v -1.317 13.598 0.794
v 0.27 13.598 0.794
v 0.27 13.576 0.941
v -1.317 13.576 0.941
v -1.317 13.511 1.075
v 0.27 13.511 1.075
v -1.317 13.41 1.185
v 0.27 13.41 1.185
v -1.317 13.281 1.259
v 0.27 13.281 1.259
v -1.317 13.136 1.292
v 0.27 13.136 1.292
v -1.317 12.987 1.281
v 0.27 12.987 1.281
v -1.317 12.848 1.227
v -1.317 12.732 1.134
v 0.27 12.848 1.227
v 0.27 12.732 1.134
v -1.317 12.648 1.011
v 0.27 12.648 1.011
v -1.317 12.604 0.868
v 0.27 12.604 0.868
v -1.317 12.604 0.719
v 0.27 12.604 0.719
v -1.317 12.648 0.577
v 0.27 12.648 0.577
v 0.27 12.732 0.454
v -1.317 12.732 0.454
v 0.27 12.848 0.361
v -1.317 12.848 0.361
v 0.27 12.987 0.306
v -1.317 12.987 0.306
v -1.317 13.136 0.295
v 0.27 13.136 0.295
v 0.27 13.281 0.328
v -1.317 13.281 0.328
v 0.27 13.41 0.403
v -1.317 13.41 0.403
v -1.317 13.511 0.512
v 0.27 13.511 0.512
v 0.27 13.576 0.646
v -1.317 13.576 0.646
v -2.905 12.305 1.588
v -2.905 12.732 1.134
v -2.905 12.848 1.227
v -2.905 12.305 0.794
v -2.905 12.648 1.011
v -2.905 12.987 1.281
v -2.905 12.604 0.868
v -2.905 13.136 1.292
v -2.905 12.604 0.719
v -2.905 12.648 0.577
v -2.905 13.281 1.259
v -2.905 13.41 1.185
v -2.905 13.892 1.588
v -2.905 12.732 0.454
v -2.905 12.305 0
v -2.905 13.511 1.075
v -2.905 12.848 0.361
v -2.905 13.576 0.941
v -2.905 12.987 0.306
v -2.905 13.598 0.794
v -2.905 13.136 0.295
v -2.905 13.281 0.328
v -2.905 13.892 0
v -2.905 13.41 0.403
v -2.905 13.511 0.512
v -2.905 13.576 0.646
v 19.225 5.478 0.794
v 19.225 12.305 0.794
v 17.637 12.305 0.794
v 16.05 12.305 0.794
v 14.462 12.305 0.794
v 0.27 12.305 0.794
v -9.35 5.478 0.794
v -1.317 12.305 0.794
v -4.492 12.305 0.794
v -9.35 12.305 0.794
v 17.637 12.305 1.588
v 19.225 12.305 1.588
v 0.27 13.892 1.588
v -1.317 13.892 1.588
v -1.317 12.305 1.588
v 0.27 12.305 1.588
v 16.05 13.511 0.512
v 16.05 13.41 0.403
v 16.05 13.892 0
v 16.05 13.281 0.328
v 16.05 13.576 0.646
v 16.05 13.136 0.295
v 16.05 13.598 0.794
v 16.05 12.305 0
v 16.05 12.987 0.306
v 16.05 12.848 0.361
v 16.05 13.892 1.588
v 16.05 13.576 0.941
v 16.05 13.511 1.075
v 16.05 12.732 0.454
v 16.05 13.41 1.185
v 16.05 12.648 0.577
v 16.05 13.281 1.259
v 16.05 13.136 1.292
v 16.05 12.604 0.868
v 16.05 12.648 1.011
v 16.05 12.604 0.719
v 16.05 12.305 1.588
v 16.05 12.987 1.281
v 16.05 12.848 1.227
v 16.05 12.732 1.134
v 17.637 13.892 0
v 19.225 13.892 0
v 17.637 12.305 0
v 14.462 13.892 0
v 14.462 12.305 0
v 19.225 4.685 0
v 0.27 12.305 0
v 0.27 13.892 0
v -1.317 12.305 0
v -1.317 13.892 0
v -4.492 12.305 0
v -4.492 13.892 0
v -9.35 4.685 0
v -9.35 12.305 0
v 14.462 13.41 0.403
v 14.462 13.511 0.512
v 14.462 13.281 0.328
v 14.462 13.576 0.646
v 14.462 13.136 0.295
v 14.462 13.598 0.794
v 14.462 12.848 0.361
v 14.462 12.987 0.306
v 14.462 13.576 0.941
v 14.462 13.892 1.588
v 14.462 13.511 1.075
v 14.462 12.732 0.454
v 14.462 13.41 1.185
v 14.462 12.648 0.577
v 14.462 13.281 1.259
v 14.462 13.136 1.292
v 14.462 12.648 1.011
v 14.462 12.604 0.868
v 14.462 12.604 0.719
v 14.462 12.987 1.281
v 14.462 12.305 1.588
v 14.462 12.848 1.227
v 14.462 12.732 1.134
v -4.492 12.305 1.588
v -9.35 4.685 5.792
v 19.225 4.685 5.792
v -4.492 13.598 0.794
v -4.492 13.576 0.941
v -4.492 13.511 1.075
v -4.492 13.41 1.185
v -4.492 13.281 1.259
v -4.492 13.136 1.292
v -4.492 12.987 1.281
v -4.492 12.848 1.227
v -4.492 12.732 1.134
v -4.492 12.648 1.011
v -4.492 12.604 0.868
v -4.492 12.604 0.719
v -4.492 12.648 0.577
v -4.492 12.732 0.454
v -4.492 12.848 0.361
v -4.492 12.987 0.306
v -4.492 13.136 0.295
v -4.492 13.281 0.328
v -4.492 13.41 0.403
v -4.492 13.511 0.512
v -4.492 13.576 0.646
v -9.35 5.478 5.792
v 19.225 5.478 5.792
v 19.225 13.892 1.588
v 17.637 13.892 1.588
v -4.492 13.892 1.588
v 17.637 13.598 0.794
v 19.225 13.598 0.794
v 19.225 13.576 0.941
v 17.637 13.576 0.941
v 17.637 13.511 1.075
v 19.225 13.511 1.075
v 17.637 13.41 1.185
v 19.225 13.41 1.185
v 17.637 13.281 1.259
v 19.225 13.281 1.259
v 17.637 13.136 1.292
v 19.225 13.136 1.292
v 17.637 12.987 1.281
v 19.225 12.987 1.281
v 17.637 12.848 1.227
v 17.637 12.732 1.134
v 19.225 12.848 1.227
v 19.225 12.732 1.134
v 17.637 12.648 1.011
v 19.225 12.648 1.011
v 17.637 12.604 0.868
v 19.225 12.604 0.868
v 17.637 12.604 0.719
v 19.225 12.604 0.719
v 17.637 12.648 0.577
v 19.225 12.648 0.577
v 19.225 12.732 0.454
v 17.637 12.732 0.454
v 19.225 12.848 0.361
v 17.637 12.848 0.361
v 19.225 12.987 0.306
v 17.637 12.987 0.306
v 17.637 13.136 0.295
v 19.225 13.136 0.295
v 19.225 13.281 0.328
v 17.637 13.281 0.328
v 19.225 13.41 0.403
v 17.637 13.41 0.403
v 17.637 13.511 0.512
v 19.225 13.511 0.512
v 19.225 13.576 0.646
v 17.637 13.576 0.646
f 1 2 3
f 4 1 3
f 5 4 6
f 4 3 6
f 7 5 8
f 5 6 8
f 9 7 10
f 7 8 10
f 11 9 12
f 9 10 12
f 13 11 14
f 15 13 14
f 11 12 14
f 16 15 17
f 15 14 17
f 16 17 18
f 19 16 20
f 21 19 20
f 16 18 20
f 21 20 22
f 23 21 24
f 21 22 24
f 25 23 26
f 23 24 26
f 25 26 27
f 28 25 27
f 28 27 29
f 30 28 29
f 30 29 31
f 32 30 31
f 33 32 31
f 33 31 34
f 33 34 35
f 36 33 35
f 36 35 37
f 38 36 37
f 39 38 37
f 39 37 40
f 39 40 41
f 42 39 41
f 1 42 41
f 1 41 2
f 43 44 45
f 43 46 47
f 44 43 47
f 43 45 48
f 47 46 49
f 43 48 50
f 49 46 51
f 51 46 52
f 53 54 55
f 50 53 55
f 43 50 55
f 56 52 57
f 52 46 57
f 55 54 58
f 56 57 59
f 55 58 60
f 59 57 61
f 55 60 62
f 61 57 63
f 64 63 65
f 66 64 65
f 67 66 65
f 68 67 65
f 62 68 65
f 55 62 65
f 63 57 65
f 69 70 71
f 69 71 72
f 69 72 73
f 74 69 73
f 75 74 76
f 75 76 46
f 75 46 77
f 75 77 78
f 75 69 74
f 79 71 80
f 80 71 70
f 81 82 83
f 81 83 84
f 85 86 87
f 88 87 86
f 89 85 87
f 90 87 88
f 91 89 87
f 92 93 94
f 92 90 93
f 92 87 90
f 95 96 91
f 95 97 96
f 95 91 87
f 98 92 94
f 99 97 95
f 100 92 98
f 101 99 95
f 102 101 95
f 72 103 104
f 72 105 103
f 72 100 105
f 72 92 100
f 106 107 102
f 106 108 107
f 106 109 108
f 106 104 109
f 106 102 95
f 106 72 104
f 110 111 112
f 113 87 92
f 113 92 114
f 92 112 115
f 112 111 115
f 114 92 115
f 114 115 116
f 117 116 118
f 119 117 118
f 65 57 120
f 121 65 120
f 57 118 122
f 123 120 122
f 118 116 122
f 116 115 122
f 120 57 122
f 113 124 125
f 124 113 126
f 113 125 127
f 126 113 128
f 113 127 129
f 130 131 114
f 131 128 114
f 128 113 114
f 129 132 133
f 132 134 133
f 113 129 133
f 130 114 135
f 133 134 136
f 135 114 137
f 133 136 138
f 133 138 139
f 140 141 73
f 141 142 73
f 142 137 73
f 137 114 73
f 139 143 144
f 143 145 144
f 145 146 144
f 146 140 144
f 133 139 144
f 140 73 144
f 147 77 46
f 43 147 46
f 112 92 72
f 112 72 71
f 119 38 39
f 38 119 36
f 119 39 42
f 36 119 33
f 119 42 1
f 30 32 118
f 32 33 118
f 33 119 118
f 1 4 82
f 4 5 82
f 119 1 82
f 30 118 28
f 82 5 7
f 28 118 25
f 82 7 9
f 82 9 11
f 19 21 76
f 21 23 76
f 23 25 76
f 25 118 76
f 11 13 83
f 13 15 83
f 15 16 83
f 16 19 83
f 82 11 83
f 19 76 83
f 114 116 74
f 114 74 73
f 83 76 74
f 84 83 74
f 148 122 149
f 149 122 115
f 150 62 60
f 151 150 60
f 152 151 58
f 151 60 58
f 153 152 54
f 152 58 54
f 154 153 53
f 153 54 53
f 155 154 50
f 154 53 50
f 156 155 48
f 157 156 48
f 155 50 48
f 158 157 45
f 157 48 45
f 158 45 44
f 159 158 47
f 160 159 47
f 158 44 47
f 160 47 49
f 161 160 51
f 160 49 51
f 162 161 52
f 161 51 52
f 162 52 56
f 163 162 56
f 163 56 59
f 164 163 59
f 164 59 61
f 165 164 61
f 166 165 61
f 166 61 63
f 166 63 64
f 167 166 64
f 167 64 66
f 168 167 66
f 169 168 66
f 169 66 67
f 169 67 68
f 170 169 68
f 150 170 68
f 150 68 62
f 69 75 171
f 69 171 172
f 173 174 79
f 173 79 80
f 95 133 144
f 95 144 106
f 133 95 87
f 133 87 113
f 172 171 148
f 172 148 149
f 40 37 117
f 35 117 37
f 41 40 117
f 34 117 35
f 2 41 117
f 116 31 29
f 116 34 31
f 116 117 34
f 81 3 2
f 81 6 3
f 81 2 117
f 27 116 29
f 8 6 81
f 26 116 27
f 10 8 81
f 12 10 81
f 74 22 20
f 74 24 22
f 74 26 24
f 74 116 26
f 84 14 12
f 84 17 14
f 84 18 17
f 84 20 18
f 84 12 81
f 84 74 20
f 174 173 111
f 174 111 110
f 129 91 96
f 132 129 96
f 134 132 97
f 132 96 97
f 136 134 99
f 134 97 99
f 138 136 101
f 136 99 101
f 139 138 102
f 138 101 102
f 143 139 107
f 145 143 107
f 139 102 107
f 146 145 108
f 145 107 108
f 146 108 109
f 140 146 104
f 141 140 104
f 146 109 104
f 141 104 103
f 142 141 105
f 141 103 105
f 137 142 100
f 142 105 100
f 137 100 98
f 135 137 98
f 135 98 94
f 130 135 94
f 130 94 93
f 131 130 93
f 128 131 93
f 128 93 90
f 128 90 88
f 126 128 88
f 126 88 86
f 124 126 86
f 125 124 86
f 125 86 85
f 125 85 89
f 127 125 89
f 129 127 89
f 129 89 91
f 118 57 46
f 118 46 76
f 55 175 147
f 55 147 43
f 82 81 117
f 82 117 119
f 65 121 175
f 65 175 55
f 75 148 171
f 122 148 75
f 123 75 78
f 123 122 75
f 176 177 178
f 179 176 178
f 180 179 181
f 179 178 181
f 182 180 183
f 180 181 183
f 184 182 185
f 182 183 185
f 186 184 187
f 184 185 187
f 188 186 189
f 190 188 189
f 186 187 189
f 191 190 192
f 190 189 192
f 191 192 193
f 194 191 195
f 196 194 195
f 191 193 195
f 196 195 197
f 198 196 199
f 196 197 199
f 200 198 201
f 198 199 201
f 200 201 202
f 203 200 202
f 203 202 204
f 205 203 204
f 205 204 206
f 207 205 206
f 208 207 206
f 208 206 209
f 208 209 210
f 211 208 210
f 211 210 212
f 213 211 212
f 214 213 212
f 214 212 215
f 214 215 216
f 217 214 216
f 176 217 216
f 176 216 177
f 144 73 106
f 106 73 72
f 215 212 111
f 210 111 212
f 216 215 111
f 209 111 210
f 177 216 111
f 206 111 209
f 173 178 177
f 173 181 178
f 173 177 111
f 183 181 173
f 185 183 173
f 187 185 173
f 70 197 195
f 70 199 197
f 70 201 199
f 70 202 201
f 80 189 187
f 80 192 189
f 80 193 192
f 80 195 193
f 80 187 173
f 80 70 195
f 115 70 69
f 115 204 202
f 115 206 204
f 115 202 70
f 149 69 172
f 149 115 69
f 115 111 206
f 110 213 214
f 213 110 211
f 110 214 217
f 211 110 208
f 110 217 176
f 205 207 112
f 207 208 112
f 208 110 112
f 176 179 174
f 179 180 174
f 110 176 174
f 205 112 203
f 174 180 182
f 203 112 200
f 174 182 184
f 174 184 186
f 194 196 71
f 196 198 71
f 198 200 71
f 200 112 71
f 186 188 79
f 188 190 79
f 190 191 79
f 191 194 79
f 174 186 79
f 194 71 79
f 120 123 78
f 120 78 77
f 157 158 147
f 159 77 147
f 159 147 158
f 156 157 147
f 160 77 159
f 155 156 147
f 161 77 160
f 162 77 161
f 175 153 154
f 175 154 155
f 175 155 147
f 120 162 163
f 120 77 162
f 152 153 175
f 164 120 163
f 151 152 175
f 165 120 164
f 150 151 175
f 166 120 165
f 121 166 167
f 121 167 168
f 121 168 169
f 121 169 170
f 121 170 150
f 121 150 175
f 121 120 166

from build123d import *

# Parameters (mm, degrees)
F0_W     = 28.575
F0_H     = 7.62
F1_DEPTH = 0.79375
F2_W     = 28.575
F2_H     = 0.79375
F3_DEPTH = 4.998339
F4_W     = 1.5875
F4_H     = 0.79375
F5_DEPTH = 1.5875
F6_W     = 1.5875
F6_H     = 1.5875
F7_DEPTH = 0.79375
F8_R     = 0.5
F9_DEPTH = 25.4


with BuildPart() as f1:
    # F0 (on Top) → F1 (new body)
    with BuildSketch(Plane.XY):
        with Locations((4.937336, 8.494605)):
            Rectangle(F0_W, F0_H)
    extrude(amount=F1_DEPTH)

    # F2 (on face) → F3 (join)
    with BuildSketch(Plane.XY.offset(0.79375)):
        with Locations((4.937336, 5.08148)):
            Rectangle(F2_W, F2_H)
    extrude(amount=F3_DEPTH)

    # F4 (on face) → F5 (join)
    with BuildSketch(Plane(origin=(0, 12.304605, 0), x_dir=(-1, 0, 0), z_dir=(0, 1, 0))):
        with Locations((-18.431086, 0.396875)):
            Rectangle(F4_W, F4_H)
        with Locations((-15.256086, 0.396875)):
            Rectangle(F4_W, F4_H)
        with Locations((0.523664, 0.396875)):
            Rectangle(F4_W, F4_H)
        with Locations((3.698664, 0.396875)):
            Rectangle(F4_W, F4_H)
    extrude(amount=F5_DEPTH)

    # F6 (on face) → F7 (join)
    with BuildSketch(Plane.XY.offset(0.79375)):
        with Locations((-3.698664, 13.098355)):
            Rectangle(F6_W, F6_H)
        with Locations((-0.523664, 13.098355)):
            Rectangle(F6_W, F6_H)
        with Locations((15.256086, 13.098355)):
            Rectangle(F6_W, F6_H)
        with Locations((18.431086, 13.098355)):
            Rectangle(F6_W, F6_H)
    extrude(amount=F7_DEPTH)

    # F8 (on face) → F9 (cut)
    with BuildSketch(Plane.YZ.offset(19.224836)):
        with Locations((13.098355, 0.79375)):
            Circle(F8_R)
    extrude(amount=-F9_DEPTH, mode=Mode.SUBTRACT)


solid = f1.part
